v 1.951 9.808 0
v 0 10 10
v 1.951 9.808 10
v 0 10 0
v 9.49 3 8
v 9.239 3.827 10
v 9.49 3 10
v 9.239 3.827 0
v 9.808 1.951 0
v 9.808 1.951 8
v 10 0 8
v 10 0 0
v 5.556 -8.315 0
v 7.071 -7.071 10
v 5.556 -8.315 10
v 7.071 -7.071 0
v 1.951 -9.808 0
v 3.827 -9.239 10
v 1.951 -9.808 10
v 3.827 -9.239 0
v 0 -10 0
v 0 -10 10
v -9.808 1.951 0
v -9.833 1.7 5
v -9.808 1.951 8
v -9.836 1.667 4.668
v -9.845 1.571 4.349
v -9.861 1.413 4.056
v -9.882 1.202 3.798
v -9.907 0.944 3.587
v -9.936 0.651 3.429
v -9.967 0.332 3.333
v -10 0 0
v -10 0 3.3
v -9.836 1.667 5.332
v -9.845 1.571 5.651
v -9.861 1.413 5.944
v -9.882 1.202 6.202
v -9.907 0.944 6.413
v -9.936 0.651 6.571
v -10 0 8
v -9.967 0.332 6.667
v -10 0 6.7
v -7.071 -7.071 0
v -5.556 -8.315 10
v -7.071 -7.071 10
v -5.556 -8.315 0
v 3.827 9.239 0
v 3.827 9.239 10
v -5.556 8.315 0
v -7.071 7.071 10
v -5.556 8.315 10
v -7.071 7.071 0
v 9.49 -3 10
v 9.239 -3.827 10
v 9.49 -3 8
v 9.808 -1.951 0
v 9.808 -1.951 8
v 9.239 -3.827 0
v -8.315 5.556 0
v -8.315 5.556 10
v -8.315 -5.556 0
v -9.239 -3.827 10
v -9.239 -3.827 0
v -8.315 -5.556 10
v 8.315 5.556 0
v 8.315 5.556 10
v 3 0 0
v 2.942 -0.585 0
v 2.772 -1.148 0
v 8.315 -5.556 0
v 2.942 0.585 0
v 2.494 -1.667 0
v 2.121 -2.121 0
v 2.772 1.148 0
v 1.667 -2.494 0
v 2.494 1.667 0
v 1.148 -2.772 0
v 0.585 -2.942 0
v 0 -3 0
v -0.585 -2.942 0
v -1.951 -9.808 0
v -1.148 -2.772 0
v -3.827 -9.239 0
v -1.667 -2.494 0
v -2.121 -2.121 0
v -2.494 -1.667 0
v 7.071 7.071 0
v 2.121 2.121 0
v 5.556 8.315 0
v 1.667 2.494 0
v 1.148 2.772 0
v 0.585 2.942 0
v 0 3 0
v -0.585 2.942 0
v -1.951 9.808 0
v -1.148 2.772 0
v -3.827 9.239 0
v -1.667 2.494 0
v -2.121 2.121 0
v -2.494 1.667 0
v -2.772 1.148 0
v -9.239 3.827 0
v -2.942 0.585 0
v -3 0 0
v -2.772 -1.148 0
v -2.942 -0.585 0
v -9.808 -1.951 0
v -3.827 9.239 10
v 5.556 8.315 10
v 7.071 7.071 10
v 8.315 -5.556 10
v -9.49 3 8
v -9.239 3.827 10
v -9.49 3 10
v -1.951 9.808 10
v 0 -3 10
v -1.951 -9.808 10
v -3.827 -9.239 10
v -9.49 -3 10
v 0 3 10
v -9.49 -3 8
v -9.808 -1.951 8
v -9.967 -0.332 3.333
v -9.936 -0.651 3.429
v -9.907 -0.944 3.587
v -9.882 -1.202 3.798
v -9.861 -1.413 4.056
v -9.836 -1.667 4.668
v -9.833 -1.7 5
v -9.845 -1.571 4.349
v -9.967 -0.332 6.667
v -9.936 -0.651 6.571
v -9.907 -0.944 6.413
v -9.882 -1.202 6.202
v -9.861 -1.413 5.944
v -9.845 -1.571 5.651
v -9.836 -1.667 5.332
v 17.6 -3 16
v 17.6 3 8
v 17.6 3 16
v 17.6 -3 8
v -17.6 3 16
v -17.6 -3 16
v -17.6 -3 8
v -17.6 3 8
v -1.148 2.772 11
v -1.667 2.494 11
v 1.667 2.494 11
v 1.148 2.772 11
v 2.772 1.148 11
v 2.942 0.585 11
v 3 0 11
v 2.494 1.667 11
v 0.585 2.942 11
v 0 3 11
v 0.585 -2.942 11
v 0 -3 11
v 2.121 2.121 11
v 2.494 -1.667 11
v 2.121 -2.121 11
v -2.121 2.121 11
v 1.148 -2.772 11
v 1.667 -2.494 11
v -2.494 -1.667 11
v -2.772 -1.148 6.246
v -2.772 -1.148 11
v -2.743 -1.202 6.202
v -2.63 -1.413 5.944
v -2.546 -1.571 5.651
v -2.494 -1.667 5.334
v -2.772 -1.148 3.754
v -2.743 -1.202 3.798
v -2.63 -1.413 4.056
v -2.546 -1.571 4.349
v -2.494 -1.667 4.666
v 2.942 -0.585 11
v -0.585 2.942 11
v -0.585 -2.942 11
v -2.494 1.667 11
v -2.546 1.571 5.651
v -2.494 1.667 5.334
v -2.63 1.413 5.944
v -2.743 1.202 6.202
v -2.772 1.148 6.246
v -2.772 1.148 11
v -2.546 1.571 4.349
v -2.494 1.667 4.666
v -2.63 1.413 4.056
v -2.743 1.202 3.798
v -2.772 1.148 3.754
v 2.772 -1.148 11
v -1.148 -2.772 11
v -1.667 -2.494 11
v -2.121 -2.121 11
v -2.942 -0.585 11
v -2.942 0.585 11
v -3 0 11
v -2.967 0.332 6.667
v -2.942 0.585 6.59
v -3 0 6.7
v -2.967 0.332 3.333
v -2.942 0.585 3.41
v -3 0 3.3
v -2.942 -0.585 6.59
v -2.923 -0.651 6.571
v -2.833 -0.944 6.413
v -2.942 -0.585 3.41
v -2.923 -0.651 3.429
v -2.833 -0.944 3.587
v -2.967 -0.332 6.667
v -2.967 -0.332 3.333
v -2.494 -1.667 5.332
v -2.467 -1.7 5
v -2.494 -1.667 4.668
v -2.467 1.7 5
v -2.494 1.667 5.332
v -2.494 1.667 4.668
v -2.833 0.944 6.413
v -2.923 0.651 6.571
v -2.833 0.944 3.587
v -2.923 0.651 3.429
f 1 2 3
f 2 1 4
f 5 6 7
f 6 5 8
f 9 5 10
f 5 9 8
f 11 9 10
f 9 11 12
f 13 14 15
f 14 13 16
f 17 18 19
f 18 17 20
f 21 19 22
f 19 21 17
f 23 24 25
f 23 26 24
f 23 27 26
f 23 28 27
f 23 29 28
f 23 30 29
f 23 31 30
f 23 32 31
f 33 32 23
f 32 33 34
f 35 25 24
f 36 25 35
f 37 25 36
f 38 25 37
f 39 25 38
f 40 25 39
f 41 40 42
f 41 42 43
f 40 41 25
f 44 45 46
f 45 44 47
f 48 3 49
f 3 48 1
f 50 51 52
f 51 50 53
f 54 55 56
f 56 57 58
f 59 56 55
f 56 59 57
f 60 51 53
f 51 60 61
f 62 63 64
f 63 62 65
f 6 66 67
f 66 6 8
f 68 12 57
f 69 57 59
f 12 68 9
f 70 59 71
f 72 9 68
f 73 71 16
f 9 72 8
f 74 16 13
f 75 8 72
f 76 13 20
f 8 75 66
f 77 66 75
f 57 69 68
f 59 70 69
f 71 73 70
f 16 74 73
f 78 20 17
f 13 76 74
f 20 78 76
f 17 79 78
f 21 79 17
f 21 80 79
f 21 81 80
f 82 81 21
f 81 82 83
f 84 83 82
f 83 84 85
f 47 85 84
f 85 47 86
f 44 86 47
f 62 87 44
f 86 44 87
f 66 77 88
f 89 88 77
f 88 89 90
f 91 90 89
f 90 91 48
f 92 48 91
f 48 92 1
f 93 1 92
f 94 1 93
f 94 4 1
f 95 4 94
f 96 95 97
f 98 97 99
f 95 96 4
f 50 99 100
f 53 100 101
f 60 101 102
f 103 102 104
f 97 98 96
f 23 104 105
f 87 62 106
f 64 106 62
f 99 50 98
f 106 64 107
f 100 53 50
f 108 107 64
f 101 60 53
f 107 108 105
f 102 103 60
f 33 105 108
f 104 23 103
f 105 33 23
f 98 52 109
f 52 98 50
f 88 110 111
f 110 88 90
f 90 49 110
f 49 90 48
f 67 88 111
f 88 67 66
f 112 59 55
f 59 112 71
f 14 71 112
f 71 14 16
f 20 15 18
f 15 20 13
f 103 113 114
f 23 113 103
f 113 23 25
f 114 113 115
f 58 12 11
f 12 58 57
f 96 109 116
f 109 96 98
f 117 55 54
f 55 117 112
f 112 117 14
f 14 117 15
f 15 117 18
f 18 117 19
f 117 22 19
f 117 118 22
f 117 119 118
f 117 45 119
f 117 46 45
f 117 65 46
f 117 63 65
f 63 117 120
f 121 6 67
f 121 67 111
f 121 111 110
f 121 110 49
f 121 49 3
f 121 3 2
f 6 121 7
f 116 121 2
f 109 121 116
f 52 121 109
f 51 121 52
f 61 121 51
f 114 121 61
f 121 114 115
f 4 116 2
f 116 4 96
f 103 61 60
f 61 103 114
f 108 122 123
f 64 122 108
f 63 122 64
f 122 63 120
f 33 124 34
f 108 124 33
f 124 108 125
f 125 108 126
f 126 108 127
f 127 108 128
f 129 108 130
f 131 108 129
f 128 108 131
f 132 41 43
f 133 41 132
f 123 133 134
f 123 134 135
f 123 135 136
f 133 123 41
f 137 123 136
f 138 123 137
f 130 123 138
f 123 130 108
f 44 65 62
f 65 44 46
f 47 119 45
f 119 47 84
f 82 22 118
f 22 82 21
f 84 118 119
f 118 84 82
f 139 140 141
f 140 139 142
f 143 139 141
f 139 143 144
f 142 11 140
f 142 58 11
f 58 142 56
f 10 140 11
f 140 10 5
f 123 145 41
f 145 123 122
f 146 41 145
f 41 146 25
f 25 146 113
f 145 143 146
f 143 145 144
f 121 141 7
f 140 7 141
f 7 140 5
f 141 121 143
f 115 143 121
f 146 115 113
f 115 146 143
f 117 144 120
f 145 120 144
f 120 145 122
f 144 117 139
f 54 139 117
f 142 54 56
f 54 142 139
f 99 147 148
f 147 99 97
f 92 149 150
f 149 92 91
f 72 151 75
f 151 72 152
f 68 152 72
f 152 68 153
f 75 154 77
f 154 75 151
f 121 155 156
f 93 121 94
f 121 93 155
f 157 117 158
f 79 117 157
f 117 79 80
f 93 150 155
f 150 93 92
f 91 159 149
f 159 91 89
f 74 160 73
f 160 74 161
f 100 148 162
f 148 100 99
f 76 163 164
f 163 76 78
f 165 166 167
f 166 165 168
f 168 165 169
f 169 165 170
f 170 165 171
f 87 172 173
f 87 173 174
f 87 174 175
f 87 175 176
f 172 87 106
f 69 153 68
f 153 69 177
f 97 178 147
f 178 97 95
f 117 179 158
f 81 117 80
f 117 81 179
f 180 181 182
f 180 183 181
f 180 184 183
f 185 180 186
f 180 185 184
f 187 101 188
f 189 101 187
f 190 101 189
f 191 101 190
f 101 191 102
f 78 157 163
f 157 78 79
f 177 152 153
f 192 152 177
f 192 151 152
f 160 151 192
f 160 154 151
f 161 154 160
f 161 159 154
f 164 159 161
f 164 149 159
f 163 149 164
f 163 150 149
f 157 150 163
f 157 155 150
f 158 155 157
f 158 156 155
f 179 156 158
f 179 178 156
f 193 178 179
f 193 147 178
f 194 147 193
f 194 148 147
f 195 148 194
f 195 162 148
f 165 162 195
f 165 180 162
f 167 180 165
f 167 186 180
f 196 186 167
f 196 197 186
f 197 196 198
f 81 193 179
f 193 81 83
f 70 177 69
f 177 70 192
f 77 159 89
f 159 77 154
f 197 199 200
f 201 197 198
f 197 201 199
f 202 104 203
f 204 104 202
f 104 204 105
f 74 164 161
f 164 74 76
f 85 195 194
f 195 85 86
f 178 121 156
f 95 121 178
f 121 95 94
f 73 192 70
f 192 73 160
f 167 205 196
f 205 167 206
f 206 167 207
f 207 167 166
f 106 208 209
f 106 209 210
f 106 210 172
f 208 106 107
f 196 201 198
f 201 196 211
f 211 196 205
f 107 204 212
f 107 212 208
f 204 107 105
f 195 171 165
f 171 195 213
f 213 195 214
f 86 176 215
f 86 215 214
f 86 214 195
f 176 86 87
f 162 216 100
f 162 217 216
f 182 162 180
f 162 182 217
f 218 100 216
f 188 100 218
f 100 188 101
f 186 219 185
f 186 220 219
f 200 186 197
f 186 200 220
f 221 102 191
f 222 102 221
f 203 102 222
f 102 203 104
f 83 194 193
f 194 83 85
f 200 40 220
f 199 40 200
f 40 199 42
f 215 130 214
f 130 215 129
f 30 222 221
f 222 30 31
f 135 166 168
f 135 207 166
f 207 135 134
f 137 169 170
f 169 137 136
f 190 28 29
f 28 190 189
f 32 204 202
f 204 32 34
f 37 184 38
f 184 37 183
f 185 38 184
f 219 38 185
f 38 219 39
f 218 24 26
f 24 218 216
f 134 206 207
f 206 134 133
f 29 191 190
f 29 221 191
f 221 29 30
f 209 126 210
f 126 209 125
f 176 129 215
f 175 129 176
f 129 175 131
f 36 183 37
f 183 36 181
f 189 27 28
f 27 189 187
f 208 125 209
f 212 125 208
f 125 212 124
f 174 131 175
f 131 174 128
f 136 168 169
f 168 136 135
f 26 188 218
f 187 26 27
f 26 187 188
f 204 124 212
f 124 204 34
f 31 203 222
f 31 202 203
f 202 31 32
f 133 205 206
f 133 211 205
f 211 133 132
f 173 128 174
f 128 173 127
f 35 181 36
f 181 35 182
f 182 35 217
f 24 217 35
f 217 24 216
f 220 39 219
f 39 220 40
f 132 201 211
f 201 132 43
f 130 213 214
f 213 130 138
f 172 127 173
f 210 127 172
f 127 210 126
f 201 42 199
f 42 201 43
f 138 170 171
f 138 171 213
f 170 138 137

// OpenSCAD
$fn = 32;

// ----------------------------------------------------------------------
// Hand knob: 20 x 35.2 x 10 mm
// ----------------------------------------------------------------------

// --- parameters (mm) ---
knob_d = 20;              // knob diameter
knob_h = 10;              // knob height
bore_d = 6;               // shaft bore
set_d = 3.4;              // set screw tap hole
wing_l = 35.2;            // wing span
wing_w = 6;               // wing width
wing_h = 6;               // wing thickness

module body() {
  cylinder(h = knob_h, d = knob_d);
}

module wing() {
  /* wing sunk 2 mm into the knob so the joint overlaps */
  translate([-wing_l / 2, -wing_w / 2, knob_h - 2])
    cube([wing_l, wing_w, wing_h + 2]);
}

difference() {
  union() {
    body();
    wing();
  }
  translate([0, 0, -1]) cylinder(h = knob_h + 0 + 2, d = bore_d);
  translate([-knob_d / 2 - 1, 0, knob_h * 0.5]) rotate([0, 90, 0]) cylinder(h = knob_d / 2 + 2, d = set_d);
}
